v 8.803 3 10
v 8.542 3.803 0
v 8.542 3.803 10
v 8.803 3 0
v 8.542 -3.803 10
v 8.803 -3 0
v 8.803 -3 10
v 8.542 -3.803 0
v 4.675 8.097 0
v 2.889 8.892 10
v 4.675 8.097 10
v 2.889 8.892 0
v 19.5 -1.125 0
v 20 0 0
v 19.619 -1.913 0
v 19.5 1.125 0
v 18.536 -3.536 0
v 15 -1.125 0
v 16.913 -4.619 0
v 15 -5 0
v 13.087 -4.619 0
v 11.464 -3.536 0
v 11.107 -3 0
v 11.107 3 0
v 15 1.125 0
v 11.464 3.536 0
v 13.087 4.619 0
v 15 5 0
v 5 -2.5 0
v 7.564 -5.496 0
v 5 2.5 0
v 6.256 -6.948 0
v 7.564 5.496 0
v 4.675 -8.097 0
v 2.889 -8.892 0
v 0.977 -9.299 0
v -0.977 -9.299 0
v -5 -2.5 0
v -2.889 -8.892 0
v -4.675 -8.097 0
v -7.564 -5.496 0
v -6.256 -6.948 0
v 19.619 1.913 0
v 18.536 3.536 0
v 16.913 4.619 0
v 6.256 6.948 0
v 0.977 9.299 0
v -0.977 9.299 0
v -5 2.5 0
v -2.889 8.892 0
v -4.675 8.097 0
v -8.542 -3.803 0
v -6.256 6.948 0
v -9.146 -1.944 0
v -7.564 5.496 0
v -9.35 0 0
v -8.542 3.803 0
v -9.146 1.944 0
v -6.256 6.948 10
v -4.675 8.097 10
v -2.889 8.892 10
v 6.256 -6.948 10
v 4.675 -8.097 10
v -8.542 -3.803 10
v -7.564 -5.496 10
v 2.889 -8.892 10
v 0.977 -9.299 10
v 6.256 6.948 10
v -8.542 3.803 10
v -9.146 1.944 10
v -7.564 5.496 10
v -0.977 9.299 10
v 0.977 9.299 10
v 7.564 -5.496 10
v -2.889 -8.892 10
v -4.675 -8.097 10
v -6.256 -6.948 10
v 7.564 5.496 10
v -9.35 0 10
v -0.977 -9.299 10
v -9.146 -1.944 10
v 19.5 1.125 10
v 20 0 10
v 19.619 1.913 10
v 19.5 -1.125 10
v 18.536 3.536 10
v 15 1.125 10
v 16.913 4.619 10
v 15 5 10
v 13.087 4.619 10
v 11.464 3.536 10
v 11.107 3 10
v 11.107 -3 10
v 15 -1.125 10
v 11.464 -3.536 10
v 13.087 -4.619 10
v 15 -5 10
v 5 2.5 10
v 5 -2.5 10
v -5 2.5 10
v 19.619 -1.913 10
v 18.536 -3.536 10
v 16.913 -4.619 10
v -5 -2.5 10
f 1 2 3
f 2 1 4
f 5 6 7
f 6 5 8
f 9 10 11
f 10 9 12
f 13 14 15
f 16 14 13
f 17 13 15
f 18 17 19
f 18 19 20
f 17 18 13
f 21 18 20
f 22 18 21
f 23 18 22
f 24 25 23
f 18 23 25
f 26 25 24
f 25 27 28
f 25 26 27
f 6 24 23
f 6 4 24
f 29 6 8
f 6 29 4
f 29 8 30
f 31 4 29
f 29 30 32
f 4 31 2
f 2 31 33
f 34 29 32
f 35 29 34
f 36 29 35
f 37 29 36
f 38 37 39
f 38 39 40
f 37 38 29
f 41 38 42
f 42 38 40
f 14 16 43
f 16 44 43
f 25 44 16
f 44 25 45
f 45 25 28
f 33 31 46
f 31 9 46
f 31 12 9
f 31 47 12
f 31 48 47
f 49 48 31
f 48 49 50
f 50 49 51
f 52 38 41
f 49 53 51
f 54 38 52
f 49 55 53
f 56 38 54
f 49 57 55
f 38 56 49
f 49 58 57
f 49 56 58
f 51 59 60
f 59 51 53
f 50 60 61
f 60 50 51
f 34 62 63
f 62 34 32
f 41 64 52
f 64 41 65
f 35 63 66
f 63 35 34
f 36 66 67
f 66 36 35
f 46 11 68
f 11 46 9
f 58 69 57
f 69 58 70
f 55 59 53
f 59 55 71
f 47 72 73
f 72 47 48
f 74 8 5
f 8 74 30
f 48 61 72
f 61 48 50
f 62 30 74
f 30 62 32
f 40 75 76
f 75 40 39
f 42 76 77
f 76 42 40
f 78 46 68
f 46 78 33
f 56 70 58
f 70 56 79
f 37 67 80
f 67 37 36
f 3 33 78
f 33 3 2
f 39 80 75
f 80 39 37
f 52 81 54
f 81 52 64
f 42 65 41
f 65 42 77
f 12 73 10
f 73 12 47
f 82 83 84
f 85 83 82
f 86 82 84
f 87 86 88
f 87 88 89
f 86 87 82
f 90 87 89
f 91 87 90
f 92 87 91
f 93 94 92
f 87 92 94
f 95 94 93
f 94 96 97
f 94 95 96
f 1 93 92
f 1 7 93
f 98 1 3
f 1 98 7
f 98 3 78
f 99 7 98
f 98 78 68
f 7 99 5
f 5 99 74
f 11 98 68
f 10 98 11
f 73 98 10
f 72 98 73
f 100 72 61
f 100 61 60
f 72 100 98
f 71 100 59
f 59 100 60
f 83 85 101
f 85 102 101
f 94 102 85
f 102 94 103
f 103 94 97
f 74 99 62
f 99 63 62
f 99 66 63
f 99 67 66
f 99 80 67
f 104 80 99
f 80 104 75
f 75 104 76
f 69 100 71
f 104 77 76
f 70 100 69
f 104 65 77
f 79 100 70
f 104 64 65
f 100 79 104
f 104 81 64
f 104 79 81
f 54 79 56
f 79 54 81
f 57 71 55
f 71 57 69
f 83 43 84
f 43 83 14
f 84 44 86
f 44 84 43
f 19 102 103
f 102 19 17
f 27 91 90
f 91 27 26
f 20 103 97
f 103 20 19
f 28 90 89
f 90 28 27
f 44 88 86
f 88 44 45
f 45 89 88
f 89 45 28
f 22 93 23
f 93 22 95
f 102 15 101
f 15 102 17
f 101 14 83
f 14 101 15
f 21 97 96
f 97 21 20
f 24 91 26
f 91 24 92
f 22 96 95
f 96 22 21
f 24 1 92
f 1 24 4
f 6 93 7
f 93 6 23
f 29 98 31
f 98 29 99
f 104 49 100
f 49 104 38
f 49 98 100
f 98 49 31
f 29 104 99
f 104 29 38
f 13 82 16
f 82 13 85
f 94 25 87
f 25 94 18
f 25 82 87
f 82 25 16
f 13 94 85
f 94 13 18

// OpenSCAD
// Tubing clip for 12.7 mm (1/2 inch) lab stand rod
// Print orientation: flat, extruded along Z (z = 0 to 10)

// ---------- Parameters ----------
extrusion_height = 10;      // Z height of the part (mm)
eps              = 0.5;     // cutter overshoot past faces (mm)

// Rod ring
stand_d  = 12.7;            // stand rod inner diameter (mm)
stand_w  = 3;               // stand ring wall thickness (mm)
stand_o  = stand_d + 2 * stand_w;  // stand ring outer diameter (mm)
stand_r  = stand_o / 2;     // stand ring outer radius (mm)
stand_x0 = 0;               // stand ring centre X (mm)
stand_y0 = 0;               // stand ring centre Y (mm)
stand_open_w = 10;          // stand ring opening width (mm)
stand_open_h = 5;           // stand ring opening height (Y extent) (mm)

// Tubing ring
tube_d  = 6;                // tubing inner diameter (mm)
tube_w  = 2;                // tubing ring wall thickness (mm)
tube_o  = tube_d + 2 * tube_w;      // tubing ring outer diameter (mm)
tube_r  = tube_o / 2;       // tubing ring outer radius (mm)
tube_x0 = 15;               // tubing ring centre X (mm)
tube_y0 = 0;                // tubing ring centre Y (mm)
tube_open_w = 4.5;          // tubing ring opening width (mm)
tube_open_h = tube_open_w / 2;      // tubing ring opening height (Y extent) (mm)

// Bridge
bridge_w = 6;               // bridge width in Y (mm)
bridge_x1 = 8;              // bridge start X (mm)
bridge_x2 = 12;             // bridge end X (mm)

// ---------- Model ----------
difference() {
    union() {
        // Rod ring
        translate([stand_x0, stand_y0, 0])
            cylinder(h = extrusion_height, r = stand_r);

        // Tubing ring
        translate([tube_x0, tube_y0, 0])
            cylinder(h = extrusion_height, r = tube_r);

        // Solid bridge between the rings
        translate([bridge_x1, -bridge_w / 2, 0])
            cube([bridge_x2 - bridge_x1, bridge_w, extrusion_height]);
    }

    // Cut the -X side of the rod ring (opening)
    translate([stand_x0 - stand_open_w / 2, -stand_open_h / 2, -eps])
        cube([stand_open_w, stand_open_h, extrusion_height + 2 * eps]);

    // Cut the +X side of the tubing ring (opening)
    translate([tube_x0, -tube_open_h / 2, -eps])
        cube([tube_open_w, tube_open_h, extrusion_height + 2 * eps]);
}
